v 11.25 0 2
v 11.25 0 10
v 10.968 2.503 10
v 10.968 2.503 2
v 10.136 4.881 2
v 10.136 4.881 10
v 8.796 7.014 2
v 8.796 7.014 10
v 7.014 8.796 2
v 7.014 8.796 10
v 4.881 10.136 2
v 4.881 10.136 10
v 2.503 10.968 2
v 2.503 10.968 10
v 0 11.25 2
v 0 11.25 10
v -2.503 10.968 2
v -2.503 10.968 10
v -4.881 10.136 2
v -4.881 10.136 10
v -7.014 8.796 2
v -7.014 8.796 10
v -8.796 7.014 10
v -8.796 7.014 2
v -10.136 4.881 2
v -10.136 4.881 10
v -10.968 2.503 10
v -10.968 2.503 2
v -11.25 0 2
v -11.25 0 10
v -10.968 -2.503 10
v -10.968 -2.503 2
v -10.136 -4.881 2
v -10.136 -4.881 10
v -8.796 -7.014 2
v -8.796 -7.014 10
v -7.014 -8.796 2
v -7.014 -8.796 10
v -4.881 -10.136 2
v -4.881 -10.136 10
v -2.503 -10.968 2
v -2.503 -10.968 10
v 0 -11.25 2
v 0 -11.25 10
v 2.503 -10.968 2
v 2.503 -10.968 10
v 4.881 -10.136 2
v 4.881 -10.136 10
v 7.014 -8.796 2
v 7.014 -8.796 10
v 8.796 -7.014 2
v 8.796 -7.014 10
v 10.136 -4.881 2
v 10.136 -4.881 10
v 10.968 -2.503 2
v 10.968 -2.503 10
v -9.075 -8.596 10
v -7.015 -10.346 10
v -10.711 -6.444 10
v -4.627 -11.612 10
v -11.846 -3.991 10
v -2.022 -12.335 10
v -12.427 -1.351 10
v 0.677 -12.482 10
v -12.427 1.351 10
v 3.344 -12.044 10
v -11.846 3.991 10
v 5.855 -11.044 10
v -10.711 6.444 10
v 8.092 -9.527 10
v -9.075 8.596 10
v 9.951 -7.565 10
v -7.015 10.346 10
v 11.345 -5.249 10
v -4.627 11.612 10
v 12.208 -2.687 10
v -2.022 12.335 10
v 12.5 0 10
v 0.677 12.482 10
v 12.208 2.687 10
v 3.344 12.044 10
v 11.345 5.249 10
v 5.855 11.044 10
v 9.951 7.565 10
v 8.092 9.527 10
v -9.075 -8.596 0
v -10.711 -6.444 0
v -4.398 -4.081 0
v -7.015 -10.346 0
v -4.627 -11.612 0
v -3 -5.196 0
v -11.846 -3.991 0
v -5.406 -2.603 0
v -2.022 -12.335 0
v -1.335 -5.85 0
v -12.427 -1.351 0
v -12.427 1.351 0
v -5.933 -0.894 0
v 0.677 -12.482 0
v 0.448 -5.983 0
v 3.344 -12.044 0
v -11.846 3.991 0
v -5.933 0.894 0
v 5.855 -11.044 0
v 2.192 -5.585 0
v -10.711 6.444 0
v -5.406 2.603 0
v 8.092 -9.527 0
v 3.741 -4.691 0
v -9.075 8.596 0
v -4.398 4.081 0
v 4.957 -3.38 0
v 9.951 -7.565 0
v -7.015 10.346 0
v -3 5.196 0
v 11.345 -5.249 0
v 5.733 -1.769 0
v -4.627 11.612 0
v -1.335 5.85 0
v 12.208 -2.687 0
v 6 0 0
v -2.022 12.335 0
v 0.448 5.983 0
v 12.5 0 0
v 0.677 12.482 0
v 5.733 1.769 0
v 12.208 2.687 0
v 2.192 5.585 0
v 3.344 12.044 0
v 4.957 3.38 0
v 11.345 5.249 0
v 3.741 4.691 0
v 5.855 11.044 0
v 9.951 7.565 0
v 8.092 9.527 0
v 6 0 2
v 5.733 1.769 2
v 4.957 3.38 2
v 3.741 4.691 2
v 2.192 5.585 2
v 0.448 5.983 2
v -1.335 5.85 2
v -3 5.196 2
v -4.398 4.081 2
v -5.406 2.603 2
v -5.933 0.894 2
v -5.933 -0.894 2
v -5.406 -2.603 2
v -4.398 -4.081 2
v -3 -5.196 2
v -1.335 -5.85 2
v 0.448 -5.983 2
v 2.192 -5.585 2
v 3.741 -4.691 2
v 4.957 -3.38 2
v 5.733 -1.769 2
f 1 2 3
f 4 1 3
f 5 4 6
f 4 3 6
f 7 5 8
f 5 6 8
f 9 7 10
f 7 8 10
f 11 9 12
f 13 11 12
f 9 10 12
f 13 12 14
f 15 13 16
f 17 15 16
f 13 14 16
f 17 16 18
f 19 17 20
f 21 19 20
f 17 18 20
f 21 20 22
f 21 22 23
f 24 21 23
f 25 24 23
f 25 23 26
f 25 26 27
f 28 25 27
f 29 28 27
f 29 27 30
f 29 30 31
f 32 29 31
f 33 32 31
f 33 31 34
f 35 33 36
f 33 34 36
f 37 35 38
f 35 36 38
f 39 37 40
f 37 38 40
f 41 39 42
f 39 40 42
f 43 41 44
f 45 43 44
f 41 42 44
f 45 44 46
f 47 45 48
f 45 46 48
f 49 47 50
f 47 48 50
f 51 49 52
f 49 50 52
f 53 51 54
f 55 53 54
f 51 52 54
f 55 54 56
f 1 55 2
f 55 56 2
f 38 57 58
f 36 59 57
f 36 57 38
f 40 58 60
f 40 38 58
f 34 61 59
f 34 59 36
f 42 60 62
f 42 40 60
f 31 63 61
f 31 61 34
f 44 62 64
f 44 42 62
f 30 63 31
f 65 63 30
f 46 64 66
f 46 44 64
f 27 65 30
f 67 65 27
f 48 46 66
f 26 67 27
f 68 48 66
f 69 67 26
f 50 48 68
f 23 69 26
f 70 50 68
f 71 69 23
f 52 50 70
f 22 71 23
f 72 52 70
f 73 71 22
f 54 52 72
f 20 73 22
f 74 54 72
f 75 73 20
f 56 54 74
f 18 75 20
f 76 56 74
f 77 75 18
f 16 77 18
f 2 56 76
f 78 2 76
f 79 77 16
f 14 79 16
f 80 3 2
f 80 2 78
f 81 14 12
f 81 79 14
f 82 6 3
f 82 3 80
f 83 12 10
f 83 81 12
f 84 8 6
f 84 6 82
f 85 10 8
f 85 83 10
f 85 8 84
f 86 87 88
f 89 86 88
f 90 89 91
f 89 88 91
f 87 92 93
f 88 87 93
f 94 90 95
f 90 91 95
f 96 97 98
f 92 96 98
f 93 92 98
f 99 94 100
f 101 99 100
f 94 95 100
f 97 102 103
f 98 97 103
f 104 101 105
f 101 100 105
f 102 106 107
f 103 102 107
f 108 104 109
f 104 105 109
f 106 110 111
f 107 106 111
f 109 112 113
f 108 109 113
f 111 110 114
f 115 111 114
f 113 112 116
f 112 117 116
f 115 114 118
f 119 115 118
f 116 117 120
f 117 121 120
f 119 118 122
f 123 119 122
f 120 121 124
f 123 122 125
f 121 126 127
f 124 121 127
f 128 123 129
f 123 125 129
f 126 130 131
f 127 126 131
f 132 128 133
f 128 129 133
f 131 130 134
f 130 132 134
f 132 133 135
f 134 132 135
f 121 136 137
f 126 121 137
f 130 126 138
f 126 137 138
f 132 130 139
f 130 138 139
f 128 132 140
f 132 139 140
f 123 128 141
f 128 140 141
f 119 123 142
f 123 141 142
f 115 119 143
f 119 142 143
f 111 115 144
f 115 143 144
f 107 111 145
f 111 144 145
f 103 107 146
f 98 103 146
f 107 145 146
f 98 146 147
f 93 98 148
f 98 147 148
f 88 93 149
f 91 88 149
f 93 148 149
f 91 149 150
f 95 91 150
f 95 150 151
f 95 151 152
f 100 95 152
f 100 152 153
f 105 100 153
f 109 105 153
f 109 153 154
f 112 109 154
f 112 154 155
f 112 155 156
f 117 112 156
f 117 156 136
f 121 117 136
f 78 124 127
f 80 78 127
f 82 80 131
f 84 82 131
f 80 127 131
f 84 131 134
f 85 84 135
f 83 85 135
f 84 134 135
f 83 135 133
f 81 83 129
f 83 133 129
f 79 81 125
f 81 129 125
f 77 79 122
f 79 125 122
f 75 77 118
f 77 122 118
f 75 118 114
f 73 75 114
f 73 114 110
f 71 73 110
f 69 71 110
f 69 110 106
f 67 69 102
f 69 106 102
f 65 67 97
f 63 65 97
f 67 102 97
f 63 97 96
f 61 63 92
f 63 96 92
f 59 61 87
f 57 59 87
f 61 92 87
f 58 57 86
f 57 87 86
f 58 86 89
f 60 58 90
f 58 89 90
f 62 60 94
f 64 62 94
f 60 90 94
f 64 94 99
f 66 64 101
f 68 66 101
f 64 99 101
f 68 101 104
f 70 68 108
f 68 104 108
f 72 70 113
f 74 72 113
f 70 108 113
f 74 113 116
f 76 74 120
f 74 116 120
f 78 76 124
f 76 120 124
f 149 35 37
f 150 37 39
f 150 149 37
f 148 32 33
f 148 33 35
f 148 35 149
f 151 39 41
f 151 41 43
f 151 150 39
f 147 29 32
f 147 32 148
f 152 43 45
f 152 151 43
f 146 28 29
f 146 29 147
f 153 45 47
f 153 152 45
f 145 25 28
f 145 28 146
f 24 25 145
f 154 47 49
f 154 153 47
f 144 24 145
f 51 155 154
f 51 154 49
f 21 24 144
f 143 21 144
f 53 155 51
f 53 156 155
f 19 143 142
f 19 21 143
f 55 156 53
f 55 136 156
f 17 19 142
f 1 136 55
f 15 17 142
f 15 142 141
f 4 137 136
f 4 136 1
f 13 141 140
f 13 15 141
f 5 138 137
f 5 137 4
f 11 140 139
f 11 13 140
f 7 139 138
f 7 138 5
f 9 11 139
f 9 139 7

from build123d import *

# Parameters (mm, degrees)
F0_R     = 12.5
F1_DEPTH = 10
F2_R     = 6
F3_DEPTH = 25
F2_R_2   = 11.25
F4_DEPTH = 8


with BuildPart() as f1:
    # F0 (on Top) → F1 (new body)
    with BuildSketch(Plane.XY):
        Circle(F0_R)
    extrude(amount=F1_DEPTH)

    # F2 (on face) → F3 (cut)
    with BuildSketch(Plane.XY.offset(10)):
        Circle(F2_R)
    extrude(amount=-F3_DEPTH, mode=Mode.SUBTRACT)

    # F2 (on face) → F4 (cut)
    with BuildSketch(Plane.XY.offset(10)):
        Circle(F2_R_2)
        Circle(F2_R, mode=Mode.SUBTRACT)
    extrude(amount=-F4_DEPTH, mode=Mode.SUBTRACT)


solid = f1.part
